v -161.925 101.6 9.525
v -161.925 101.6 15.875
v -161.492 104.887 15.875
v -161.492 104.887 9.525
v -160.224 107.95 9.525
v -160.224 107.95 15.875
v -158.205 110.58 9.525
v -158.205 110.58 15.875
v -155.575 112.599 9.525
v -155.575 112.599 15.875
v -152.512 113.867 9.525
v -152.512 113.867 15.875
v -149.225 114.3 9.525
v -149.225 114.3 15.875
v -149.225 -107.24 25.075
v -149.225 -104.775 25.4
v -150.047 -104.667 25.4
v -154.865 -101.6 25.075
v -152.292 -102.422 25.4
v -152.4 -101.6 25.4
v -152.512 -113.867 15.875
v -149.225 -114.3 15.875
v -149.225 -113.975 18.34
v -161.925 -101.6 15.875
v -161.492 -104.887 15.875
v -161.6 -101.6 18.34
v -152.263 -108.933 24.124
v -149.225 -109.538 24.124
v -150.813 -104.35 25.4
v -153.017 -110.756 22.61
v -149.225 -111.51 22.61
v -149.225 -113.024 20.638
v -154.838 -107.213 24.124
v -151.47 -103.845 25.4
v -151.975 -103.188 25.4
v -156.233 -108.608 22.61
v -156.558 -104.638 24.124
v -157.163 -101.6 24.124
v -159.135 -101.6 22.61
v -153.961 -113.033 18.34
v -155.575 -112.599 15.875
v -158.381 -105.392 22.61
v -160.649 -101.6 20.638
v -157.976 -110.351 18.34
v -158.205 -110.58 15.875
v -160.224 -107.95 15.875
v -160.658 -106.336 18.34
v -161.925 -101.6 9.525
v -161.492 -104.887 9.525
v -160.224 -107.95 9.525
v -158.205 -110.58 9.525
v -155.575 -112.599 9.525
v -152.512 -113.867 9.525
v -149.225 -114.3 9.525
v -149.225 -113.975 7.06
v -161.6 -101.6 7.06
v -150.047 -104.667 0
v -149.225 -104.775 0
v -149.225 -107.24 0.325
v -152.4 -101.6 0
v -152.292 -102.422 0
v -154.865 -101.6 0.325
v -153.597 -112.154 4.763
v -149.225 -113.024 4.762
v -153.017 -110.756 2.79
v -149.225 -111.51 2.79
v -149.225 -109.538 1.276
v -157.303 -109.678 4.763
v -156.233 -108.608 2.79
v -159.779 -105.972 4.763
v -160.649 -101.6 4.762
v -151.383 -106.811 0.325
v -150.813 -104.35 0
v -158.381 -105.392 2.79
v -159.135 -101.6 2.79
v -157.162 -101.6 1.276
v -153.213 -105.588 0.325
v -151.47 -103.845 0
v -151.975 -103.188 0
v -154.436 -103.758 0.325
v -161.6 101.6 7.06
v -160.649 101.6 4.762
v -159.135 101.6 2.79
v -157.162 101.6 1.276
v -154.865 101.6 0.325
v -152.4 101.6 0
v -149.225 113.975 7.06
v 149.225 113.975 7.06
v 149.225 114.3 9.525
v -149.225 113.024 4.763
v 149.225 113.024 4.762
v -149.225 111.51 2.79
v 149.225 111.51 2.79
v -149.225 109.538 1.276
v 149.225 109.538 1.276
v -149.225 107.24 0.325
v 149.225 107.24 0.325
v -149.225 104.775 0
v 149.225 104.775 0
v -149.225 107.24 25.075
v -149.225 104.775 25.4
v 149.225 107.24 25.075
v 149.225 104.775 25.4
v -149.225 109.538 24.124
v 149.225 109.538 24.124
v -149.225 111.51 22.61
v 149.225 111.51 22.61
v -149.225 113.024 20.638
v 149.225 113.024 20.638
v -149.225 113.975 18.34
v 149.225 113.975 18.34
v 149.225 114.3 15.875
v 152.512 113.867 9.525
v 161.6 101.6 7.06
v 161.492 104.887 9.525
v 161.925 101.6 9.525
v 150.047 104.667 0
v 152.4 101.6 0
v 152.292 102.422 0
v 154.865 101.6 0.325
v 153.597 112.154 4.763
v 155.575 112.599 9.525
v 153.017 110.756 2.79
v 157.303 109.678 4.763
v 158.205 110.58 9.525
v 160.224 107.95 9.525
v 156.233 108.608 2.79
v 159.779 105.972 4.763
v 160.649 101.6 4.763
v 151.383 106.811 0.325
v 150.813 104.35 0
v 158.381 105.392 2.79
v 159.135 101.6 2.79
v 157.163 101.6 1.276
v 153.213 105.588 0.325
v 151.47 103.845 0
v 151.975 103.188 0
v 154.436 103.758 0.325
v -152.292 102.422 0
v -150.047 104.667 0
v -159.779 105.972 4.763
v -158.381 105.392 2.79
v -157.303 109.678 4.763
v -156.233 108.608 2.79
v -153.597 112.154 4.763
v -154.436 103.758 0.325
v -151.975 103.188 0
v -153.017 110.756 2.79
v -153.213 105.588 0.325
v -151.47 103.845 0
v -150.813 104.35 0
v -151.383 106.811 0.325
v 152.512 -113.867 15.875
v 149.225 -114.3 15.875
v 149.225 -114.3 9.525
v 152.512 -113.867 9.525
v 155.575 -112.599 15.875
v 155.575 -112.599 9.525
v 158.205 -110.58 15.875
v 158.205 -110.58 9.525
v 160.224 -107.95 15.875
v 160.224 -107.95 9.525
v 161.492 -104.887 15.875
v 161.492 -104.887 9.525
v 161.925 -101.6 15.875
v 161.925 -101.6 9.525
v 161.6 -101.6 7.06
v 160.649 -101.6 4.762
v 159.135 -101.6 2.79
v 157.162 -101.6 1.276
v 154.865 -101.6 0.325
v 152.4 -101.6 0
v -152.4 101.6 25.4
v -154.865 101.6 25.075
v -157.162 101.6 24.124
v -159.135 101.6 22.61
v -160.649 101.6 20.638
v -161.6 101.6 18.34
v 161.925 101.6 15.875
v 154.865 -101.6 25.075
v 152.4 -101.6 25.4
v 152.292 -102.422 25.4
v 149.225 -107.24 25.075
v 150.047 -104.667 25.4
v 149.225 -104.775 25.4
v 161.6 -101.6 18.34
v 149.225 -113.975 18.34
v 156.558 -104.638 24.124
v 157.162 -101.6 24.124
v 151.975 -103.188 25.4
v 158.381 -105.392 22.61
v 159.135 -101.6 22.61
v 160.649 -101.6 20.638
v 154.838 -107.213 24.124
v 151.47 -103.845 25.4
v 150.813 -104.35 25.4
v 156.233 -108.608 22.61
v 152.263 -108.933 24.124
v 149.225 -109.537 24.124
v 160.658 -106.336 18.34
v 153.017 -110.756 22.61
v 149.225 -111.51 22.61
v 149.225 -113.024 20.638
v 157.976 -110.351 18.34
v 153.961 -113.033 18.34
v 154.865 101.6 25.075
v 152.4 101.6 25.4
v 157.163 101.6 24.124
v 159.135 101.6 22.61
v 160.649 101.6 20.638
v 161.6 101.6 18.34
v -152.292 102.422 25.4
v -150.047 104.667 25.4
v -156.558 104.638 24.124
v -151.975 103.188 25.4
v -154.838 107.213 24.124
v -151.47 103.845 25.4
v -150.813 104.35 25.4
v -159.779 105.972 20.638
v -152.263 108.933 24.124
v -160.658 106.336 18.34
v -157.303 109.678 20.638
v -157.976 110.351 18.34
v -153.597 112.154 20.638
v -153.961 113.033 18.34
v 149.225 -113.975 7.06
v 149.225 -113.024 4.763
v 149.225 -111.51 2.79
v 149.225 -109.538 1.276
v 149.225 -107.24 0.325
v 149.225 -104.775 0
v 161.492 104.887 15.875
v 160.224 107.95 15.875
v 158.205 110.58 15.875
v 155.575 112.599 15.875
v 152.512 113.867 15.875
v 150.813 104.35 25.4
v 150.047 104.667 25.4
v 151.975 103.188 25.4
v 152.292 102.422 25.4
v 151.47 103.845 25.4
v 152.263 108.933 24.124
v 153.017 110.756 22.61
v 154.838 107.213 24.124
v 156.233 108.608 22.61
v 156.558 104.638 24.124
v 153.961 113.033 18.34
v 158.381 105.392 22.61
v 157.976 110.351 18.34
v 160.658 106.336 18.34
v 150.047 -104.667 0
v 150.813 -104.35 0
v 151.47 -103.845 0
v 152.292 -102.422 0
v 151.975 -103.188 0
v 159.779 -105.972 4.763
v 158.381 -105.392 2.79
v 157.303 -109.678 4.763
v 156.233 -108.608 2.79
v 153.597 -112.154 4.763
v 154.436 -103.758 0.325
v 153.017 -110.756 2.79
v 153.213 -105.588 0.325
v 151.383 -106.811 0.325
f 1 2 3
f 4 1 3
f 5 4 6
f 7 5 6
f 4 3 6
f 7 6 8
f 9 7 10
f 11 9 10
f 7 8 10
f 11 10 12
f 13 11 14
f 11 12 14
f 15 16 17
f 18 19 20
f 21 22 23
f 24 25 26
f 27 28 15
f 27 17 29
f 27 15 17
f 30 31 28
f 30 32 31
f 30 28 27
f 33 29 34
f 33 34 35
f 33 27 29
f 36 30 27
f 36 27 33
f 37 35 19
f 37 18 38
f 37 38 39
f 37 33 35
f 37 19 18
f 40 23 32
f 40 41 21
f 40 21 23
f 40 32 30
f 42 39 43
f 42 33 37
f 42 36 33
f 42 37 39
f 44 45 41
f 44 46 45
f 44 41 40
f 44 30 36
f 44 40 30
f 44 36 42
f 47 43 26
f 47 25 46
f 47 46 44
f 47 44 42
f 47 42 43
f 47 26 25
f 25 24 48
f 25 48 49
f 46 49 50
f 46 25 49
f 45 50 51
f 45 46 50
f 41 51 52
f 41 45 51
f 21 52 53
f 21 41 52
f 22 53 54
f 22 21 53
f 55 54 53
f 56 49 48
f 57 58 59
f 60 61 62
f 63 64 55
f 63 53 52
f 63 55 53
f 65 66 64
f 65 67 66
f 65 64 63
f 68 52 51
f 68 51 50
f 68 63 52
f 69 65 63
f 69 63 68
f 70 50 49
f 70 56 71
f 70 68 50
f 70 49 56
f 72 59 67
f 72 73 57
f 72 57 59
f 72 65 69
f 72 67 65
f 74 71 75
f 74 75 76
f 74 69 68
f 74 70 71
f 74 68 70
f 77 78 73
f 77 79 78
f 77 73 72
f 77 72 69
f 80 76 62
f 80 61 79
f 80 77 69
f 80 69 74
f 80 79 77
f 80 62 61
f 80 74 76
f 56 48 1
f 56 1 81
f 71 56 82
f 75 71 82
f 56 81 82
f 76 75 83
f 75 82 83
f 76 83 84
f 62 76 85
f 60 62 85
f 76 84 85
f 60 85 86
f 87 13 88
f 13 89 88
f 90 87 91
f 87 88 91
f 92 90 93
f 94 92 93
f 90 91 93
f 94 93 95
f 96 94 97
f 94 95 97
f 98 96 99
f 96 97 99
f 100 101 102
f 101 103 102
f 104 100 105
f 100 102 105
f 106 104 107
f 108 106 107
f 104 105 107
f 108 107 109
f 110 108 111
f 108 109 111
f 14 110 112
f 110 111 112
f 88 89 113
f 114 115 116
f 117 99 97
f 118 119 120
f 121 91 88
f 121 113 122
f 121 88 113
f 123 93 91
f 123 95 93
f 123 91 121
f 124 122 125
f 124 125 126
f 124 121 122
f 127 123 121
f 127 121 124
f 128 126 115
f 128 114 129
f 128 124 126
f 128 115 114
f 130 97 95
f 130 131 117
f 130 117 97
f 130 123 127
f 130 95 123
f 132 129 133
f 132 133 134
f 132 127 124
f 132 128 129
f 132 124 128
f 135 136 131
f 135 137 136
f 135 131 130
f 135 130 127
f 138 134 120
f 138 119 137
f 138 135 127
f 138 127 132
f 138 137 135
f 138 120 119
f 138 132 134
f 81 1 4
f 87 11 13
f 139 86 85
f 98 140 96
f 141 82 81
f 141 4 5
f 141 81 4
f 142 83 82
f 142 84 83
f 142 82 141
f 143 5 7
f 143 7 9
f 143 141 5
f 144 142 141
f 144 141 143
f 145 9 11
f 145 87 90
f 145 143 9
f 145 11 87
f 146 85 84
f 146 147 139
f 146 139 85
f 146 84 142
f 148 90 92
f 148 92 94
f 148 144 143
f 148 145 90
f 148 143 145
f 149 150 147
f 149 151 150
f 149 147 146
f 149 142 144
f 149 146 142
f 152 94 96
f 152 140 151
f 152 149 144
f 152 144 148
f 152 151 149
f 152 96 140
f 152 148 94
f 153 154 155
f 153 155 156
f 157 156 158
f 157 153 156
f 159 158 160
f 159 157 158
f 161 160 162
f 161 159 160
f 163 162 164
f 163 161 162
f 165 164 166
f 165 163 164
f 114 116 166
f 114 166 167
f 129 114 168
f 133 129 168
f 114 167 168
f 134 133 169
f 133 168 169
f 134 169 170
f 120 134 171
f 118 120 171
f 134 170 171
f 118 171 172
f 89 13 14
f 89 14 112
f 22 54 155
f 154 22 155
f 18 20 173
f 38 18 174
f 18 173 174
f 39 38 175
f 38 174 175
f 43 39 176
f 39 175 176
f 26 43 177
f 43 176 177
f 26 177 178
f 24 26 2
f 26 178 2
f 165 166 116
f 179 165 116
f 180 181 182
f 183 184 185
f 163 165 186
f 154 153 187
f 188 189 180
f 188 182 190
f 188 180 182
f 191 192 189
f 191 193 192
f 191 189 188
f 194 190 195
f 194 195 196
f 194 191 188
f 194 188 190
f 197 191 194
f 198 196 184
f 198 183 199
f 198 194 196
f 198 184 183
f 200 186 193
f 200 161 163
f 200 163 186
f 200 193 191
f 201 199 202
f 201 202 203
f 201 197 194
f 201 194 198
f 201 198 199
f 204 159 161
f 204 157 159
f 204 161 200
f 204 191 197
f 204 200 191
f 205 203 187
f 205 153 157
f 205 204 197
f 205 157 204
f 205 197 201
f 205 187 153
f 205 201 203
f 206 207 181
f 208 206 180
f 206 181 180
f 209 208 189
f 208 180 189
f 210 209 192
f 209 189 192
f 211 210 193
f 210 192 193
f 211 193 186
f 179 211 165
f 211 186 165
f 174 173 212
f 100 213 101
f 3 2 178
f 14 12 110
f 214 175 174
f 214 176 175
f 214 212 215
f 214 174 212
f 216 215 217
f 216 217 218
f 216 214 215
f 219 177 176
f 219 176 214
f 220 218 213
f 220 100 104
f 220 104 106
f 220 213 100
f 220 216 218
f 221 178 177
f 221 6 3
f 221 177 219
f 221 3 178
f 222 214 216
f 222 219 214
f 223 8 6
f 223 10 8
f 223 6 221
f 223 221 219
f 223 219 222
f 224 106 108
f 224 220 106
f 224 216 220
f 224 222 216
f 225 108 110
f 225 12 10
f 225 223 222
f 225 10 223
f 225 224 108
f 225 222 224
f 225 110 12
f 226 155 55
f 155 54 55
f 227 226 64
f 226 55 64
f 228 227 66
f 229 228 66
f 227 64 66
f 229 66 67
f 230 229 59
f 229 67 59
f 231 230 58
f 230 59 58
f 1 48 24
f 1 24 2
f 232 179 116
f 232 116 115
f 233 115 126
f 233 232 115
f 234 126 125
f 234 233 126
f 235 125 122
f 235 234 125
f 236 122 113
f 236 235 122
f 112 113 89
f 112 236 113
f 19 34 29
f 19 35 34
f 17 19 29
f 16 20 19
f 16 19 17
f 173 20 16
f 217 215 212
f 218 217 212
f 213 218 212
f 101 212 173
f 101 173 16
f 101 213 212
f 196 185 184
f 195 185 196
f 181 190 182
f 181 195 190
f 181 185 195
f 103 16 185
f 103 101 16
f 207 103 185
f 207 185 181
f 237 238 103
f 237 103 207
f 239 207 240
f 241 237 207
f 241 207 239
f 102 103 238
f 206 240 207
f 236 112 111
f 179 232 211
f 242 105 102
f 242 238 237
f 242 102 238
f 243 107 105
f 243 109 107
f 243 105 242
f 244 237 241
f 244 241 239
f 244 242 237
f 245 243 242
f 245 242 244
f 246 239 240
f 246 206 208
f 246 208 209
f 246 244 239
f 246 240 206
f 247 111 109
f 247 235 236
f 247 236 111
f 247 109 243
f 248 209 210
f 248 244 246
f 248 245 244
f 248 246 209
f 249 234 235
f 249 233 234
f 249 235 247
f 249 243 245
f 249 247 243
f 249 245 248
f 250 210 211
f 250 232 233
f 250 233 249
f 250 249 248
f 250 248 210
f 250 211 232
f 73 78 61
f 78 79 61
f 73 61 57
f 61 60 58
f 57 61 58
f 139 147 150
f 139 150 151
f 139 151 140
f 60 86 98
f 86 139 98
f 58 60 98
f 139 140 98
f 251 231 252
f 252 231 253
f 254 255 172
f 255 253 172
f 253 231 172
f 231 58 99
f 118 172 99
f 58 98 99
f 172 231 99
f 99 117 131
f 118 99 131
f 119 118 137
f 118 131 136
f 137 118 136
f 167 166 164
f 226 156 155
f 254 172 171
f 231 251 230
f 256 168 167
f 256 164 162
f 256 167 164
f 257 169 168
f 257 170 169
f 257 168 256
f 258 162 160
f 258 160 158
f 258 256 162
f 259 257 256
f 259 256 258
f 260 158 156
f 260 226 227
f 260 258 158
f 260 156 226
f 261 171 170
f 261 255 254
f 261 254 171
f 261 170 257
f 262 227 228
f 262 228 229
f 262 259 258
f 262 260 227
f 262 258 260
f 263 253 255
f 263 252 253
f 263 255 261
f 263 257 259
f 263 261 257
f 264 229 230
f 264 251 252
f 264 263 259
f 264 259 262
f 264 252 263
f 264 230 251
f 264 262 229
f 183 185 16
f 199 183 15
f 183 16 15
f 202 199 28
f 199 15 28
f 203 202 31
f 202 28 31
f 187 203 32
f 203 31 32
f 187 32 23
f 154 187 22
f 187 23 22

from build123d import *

# Parameters (mm, degrees)
F0_W     = 323.85
F0_H     = 228.6
F1_DEPTH = 25.4
F2_R     = 12.7
F3_R     = 9.525


with BuildPart() as f1:
    # F0 (on Top) → F1 (new body)
    with BuildSketch(Plane.XY):
        Rectangle(F0_W, F0_H)
    extrude(amount=F1_DEPTH)

    # F2
    f2_edges = [f1.edges().sort_by_distance(p)[0] for p in [
        (-161.925, -114.3, 12.7),
        (161.925, -114.3, 12.7),
        (161.925, 114.3, 12.7),
        (-161.925, 114.3, 12.7),
    ]]
    fillet(f2_edges, radius=F2_R)

    # F3
    f3_edges = [f1.edges().sort_by_distance(p)[0] for p in [
        (0, 114.3, 25.4),
        (-161.925, 0, 0),
    ]]
    fillet(f3_edges, radius=F3_R)


solid = f1.part
